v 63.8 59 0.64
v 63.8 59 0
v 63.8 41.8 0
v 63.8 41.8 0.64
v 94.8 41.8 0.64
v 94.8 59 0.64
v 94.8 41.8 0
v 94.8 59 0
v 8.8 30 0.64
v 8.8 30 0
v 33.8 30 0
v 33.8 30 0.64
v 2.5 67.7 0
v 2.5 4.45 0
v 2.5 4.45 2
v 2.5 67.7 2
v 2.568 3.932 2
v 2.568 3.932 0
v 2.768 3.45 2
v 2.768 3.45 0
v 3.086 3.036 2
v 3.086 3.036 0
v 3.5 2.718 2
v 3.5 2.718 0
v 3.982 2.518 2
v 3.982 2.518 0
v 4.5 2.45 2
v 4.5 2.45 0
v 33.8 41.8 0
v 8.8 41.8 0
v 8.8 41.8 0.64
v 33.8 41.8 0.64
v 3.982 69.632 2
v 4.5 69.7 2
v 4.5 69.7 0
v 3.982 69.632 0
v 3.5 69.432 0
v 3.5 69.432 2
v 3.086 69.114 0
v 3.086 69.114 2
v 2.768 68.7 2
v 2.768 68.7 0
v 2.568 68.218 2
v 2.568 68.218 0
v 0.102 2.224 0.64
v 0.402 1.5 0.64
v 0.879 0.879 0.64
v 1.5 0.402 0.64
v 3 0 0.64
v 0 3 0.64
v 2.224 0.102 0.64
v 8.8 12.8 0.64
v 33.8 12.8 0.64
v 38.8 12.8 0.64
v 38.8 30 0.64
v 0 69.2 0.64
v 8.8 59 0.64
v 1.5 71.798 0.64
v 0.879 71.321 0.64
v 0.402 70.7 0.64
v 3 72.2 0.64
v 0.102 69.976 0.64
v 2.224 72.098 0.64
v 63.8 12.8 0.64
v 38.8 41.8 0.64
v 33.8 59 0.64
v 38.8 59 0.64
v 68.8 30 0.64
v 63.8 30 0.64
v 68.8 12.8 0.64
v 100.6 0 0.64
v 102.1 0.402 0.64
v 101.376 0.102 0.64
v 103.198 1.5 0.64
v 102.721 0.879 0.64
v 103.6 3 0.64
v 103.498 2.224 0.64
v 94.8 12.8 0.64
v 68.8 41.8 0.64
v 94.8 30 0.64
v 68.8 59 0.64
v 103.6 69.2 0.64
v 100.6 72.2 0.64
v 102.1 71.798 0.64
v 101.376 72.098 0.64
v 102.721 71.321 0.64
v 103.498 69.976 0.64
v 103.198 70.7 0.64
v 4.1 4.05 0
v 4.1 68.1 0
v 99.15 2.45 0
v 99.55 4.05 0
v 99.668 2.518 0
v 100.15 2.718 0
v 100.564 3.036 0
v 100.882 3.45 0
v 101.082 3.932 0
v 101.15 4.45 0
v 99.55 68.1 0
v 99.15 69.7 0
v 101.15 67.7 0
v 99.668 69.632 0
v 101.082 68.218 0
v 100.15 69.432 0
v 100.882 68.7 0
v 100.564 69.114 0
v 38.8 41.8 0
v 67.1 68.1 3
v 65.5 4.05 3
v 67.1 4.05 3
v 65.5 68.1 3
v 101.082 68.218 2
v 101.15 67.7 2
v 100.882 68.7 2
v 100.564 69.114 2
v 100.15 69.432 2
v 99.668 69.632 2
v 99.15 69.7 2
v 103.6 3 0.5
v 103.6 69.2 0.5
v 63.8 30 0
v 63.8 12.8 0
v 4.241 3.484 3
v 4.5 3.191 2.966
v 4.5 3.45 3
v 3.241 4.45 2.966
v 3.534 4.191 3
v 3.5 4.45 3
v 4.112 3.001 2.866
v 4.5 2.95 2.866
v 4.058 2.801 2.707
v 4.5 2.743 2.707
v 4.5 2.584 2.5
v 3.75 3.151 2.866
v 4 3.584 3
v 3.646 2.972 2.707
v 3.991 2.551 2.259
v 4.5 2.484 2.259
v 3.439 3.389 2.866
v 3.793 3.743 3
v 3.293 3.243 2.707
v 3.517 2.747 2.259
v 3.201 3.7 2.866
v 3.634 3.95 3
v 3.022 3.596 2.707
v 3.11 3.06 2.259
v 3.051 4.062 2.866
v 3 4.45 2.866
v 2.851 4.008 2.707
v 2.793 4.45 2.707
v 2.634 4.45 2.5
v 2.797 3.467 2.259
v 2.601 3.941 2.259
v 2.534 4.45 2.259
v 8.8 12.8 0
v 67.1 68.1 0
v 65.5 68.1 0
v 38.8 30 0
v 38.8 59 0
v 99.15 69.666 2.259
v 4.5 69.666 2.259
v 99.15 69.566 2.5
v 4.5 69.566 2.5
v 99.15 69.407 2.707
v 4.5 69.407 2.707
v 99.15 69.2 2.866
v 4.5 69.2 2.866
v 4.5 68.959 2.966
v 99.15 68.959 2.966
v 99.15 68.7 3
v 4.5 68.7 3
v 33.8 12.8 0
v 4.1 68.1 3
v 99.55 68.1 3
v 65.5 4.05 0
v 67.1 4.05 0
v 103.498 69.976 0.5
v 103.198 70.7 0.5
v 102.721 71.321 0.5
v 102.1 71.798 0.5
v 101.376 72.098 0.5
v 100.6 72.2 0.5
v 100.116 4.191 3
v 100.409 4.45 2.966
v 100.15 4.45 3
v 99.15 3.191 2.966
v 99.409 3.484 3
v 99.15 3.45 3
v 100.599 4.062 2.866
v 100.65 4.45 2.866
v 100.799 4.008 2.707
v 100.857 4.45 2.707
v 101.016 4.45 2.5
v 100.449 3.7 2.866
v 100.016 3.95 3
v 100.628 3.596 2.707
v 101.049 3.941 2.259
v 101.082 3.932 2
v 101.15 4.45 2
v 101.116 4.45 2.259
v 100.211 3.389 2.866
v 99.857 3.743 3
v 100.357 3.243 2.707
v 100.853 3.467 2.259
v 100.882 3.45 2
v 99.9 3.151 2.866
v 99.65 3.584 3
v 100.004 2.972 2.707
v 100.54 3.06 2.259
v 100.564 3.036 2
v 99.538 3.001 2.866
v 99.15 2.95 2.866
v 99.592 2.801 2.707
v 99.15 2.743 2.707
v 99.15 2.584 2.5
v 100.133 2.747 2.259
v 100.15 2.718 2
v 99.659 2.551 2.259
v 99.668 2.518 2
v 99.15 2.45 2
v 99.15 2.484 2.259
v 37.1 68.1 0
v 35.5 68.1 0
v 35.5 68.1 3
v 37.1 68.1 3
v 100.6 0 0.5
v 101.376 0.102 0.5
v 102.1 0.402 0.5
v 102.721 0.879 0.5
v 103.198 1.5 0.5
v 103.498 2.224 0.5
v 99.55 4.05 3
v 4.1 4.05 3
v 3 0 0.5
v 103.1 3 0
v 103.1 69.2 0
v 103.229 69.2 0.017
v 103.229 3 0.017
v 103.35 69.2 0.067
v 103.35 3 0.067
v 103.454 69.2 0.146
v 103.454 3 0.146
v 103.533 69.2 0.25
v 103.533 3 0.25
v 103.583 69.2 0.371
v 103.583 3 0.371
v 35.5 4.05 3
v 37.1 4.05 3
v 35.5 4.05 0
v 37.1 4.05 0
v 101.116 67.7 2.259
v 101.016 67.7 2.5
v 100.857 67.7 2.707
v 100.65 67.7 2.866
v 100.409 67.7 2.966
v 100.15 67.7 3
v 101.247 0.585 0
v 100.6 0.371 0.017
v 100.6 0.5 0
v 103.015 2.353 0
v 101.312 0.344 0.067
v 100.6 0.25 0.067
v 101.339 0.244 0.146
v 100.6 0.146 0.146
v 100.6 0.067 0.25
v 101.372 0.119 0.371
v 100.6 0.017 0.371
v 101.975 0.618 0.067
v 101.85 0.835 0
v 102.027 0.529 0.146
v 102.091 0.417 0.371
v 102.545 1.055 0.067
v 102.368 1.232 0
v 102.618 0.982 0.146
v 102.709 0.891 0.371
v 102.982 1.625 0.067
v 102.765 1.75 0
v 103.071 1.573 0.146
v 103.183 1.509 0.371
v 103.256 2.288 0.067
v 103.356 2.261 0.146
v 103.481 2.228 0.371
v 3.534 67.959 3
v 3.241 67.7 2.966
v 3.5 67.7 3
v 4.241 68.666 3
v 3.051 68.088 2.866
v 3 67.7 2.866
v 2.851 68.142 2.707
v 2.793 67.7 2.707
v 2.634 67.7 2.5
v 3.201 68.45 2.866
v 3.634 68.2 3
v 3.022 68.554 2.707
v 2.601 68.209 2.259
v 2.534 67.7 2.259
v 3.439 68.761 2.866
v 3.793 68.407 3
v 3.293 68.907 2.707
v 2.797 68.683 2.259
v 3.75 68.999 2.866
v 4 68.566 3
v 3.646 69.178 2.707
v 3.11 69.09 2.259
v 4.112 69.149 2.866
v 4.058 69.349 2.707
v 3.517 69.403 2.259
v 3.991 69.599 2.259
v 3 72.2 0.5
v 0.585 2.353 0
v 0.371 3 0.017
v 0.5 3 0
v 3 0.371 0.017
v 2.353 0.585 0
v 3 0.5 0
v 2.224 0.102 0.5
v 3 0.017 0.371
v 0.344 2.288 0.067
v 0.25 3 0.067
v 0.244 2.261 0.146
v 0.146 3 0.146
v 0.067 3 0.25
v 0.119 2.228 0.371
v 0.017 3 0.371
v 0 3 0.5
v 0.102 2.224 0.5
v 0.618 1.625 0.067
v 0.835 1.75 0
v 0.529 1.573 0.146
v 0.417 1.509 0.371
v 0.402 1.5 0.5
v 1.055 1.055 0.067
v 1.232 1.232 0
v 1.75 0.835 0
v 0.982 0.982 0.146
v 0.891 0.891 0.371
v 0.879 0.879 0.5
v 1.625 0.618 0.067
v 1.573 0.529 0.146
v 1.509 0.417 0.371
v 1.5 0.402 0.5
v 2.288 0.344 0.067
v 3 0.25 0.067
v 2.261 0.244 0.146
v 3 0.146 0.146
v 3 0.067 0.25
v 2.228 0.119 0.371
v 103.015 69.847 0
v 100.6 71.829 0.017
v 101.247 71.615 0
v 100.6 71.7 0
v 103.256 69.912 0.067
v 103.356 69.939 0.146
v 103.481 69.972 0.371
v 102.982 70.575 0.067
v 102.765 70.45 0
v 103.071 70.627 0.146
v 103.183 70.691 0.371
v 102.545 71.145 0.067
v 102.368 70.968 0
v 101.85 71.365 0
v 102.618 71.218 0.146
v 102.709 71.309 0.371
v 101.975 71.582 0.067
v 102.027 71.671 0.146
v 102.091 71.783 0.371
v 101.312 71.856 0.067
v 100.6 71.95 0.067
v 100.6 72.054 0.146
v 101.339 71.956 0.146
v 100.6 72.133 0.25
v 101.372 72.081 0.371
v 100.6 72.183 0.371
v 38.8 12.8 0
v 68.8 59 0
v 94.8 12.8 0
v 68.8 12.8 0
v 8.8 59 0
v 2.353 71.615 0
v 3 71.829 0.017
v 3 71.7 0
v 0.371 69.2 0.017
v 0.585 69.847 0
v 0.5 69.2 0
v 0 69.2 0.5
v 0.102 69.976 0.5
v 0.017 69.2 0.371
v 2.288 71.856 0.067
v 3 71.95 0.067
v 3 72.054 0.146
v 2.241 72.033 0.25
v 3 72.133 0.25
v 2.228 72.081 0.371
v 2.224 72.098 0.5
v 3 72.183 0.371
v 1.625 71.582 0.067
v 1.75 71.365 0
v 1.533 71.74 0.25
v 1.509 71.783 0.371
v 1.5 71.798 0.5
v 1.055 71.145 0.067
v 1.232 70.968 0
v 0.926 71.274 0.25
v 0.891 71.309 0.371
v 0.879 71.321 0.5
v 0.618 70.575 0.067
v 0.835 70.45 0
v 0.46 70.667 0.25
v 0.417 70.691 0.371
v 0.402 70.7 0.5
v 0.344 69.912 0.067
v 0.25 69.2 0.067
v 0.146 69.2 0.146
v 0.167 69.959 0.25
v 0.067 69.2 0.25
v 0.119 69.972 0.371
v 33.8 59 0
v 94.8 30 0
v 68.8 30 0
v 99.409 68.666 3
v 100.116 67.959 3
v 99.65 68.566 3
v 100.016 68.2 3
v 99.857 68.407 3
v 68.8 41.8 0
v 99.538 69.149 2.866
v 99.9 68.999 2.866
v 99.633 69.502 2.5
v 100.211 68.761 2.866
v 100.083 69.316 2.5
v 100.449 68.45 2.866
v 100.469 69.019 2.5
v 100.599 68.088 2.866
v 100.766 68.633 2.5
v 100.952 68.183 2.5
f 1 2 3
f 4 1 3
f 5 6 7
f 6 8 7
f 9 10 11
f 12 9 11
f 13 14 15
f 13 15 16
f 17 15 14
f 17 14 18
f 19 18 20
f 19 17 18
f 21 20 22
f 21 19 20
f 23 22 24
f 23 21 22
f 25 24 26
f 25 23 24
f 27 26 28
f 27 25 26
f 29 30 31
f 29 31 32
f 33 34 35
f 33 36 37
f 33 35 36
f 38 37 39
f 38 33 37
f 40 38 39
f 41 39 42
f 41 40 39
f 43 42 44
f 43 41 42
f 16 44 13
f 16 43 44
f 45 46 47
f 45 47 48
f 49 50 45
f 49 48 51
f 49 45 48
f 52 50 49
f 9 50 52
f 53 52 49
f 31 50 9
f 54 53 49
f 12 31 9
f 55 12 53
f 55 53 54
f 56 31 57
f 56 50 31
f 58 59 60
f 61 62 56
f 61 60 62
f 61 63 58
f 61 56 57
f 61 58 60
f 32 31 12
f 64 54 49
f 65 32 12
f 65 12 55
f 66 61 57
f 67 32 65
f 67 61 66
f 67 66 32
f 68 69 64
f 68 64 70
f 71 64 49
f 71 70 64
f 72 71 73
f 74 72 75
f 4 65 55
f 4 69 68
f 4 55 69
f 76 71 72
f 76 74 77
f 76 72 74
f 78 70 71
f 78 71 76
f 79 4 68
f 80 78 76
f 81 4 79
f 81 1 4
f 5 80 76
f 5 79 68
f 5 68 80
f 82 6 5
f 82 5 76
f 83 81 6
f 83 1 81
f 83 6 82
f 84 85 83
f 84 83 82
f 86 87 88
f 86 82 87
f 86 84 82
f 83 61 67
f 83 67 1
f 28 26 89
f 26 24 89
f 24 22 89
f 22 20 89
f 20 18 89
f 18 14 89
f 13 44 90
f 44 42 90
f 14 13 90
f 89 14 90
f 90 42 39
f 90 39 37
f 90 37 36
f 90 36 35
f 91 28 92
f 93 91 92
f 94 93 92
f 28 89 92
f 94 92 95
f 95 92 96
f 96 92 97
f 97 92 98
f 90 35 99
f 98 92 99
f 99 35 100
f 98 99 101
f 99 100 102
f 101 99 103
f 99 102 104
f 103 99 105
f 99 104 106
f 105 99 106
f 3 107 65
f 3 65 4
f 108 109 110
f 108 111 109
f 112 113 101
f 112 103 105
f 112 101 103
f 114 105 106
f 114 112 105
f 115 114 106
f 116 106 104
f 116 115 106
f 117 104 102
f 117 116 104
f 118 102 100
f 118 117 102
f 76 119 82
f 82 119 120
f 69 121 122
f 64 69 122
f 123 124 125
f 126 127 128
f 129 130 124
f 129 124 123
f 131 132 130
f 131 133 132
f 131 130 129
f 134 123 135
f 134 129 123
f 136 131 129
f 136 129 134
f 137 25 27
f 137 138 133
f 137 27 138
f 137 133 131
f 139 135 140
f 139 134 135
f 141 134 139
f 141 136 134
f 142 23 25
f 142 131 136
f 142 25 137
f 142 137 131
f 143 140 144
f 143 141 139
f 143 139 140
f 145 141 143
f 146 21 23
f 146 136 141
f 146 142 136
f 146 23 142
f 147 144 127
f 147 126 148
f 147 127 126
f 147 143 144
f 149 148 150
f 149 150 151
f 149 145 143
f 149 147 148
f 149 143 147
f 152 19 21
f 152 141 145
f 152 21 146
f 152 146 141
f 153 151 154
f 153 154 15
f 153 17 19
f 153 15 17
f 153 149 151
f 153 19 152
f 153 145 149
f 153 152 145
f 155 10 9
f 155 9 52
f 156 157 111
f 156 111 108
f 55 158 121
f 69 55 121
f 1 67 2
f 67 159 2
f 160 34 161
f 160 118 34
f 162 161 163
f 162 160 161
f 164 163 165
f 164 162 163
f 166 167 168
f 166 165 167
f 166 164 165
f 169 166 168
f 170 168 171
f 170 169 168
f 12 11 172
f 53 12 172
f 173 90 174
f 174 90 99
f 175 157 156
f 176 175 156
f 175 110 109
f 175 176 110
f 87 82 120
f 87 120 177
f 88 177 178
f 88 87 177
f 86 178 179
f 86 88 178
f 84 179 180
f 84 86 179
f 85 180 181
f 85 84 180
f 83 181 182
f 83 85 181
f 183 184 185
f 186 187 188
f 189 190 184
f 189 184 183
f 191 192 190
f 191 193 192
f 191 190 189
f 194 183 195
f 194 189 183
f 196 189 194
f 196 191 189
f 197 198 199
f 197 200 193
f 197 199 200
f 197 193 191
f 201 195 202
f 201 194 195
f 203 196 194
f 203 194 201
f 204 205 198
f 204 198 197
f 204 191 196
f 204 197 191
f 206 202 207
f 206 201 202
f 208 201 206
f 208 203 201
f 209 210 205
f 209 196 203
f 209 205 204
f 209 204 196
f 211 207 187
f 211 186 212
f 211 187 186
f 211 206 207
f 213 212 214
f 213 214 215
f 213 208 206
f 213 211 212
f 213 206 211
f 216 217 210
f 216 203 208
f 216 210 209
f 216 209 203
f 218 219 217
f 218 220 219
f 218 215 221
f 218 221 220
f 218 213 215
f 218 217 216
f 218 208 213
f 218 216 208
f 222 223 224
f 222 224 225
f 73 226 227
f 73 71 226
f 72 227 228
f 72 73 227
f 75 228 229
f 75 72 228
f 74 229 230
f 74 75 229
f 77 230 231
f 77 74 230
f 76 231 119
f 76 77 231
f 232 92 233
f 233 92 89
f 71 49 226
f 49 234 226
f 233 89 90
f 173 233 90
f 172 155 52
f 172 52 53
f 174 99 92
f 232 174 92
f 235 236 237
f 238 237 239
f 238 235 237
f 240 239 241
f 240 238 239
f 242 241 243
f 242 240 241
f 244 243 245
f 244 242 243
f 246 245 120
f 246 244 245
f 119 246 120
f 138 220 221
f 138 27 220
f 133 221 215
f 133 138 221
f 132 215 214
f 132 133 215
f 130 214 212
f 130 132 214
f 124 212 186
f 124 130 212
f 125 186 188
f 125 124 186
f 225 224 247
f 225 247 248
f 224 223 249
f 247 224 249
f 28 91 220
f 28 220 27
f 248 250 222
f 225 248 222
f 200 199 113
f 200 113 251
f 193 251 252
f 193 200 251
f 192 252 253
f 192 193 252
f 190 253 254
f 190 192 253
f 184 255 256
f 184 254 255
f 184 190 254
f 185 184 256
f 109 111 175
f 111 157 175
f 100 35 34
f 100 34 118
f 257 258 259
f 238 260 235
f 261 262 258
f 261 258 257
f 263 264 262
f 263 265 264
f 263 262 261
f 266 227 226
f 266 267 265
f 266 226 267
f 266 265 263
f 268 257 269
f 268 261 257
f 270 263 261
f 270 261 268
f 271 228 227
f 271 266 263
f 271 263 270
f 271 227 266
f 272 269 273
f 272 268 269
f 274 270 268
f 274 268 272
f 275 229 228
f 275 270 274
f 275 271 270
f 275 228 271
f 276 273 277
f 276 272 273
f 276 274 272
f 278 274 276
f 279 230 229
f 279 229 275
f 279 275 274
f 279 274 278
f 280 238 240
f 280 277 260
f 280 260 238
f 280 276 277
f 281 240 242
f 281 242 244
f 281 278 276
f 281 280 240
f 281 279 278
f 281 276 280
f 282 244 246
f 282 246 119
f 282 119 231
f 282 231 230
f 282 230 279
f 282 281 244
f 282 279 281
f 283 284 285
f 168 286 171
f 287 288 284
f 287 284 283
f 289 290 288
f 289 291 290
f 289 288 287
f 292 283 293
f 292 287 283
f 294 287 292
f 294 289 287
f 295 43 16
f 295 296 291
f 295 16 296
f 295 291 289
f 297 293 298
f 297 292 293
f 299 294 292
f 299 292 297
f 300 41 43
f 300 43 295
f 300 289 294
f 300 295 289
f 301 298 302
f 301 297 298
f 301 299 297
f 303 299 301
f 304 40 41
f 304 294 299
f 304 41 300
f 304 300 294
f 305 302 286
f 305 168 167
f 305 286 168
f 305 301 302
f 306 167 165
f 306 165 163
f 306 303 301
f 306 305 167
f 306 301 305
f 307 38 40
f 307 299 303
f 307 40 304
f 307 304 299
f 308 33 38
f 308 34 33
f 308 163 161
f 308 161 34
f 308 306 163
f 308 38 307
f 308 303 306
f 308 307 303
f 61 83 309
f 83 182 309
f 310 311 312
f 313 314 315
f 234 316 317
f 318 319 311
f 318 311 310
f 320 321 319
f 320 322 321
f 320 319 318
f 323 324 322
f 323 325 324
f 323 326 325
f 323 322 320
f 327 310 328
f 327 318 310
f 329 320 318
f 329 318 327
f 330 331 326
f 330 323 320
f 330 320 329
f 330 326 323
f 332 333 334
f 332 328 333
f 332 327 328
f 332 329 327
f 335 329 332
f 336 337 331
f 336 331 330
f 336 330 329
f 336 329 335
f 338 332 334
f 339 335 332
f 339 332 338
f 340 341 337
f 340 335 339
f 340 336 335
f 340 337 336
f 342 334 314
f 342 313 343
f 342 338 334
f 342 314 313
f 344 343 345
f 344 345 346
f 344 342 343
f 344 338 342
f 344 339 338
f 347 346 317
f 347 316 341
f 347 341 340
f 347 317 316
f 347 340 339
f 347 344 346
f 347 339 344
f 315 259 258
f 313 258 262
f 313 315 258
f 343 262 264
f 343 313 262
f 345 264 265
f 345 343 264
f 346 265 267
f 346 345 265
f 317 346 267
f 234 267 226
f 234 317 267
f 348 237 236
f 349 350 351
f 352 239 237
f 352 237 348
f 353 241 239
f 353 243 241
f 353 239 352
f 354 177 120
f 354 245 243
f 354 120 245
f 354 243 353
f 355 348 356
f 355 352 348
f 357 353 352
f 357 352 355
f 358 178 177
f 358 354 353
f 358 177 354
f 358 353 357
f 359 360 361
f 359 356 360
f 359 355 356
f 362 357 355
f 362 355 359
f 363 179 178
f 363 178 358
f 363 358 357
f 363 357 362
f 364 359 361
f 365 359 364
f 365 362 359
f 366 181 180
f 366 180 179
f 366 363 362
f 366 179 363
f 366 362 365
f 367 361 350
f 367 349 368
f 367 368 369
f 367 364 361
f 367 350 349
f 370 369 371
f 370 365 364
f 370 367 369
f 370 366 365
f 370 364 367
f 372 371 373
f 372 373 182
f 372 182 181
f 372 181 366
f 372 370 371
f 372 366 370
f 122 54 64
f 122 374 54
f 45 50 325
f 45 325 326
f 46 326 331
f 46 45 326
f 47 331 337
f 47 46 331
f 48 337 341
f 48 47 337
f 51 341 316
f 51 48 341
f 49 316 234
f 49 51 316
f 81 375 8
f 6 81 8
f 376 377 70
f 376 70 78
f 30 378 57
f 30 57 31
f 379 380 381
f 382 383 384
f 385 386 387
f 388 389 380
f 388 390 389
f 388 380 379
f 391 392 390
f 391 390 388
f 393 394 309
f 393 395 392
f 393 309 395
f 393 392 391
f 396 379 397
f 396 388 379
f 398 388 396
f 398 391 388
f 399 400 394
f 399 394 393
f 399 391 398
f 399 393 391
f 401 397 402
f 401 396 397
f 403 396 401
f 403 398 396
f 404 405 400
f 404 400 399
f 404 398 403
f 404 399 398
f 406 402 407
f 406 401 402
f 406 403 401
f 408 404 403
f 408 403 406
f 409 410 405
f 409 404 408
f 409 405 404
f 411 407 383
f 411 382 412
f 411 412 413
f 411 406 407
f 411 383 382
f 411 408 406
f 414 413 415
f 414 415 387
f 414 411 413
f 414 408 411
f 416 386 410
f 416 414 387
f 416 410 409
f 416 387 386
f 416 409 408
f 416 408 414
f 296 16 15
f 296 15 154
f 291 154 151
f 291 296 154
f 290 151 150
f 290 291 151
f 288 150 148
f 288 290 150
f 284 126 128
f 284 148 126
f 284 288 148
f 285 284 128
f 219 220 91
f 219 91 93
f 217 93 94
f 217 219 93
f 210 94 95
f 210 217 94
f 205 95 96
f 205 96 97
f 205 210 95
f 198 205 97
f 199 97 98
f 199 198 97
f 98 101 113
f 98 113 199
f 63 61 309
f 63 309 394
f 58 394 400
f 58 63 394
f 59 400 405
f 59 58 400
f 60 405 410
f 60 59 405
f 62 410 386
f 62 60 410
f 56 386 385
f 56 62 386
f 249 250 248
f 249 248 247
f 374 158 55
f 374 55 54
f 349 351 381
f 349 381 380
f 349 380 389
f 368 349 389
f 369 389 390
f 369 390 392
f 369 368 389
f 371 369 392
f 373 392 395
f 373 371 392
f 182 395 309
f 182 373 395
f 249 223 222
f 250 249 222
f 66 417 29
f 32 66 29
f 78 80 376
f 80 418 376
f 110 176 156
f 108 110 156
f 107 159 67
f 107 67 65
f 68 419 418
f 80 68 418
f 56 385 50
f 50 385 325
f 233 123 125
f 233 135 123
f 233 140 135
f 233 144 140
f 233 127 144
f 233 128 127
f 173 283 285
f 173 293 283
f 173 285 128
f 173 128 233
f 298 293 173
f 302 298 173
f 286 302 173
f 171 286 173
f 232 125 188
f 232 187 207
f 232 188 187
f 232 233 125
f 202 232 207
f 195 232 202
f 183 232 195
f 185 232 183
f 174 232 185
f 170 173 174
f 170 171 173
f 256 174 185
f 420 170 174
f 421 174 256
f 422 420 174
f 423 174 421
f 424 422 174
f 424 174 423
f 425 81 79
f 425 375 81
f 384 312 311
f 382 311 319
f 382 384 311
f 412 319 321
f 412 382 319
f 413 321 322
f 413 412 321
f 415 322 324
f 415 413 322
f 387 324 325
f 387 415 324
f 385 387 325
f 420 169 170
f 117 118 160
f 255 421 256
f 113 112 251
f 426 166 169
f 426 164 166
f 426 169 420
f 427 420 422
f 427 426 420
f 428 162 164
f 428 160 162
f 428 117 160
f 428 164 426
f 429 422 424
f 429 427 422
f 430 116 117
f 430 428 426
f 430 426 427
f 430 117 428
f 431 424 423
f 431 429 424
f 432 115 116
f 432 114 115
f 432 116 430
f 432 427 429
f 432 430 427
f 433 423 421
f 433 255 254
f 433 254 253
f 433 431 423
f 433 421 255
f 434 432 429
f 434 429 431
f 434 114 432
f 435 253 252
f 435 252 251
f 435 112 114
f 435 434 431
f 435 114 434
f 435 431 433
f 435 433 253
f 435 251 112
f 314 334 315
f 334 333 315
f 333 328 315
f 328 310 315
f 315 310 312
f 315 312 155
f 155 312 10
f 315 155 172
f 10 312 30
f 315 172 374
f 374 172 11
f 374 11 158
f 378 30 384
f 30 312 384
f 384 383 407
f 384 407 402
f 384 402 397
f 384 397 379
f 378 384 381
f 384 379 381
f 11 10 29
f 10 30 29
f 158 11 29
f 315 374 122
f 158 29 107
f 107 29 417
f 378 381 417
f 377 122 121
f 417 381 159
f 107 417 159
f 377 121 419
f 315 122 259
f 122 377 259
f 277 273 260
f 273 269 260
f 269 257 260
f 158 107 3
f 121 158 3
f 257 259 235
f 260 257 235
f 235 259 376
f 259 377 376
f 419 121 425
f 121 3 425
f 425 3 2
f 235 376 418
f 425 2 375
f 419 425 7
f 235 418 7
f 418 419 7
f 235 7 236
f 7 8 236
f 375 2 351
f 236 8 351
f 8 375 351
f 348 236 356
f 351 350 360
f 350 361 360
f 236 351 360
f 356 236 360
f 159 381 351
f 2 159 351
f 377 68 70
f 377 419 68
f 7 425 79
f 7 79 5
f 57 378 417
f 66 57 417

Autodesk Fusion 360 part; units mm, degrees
sketch "Sketch1" plane through (0, 0, 0) normal (0, 0, 1) x (1, 0, 0)
  line L0 (0, 0) -> (103.6, 0)
  line L1 (103.6, 0) -> (103.6, 72.2)
  line L2 (103.6, 72.2) -> (0, 72.2)
  line L3 (0, 72.2) -> (0, 0)
  line L4 (94.8, 80) -> (94.8, -25)
  line L5 (68.8, 80) -> (68.8, -25)
  line L6 (63.8, 80) -> (63.8, -25)
  line L7 (38.8, 80) -> (38.8, -25)
  line L8 (33.8, 80) -> (33.8, -25)
  line L9 (8.8, 80) -> (8.8, -25)
  line L10 (-20, 59) -> (140, 59)
  line L11 (-20, 41.8) -> (140, 41.8)
  line L12 (-20, 30) -> (140, 30)
  line L13 (-20, 12.8) -> (140, 12.8)
  line L14 (2.5, 69.7) -> (101.15, 69.7)
  line L15 (101.15, 69.7) -> (101.15, 2.45)
  line L16 (101.15, 2.45) -> (2.5, 2.45)
  line L17 (2.5, 2.45) -> (2.5, 69.7)
  line L18 (4.1, 68.1) -> (99.55, 68.1)
  line L19 (99.55, 68.1) -> (99.55, 4.05)
  line L20 (99.55, 4.05) -> (4.1, 4.05)
  line L21 (4.1, 4.05) -> (4.1, 68.1)
  line L22 (35.5, 80) -> (35.5, -25)
  line L23 (37.1, -25) -> (37.1, 80)
  line L24 (65.5, 80) -> (65.5, -25)
  line L25 (67.1, -25) -> (67.1, 80)
  circle A0 centre (6.5, 65.9) radius 1.6
  circle A1 centre (97.3, 65.8) radius 1.6
  circle A2 centre (97.2, 6.1) radius 1.6
  circle A3 centre (6.5, 6.3) radius 1.6
  dimension "d1" = 103.6
  dimension "d2" = 72.2
  dimension "d3" = 8.8
  dimension "d4" = 26
  dimension "d5" = 5
  dimension "d7" = 5
  dimension "d8" = 25
  dimension "d10" = 8.8
  dimension "d11" = 25
  dimension "d12" = 17.2
  dimension "d13" = 17.2
  dimension "d14" = 11.8
  dimension "d15" = 12.8
  dimension "d16" = 13.2
  dimension "d17" = 2.5
  dimension "d18" = 2.5
  dimension "d19" = 2.45
  dimension "d20" = 2.45
  dimension "d21" = 1.6
  dimension "d22" = 1.6
  dimension "d23" = 1.6
  dimension "d24" = 1.6
  dimension "d37" = 1.6
  dimension "d38" = 1.7
  dimension "d39" = 1.7
  dimension "d40" = 1.6
  dimension "d41" = 1.7
  dimension "d44" = 3.2
  dimension "d45" = 6.5
  dimension "d46" = 6.3
  dimension "d47" = 3.2
  dimension "d48" = 6.3
  dimension "d49" = 6.4
  dimension "d50" = 3.2
  dimension "d51" = 6.4
  dimension "d52" = 6.1
  dimension "d53" = 3.2
  dimension "d54" = 6.5
  dimension "d55" = 6.3
extrude "Extrude1" add sketch "Sketch1" along normal blind 0.64 contours L0 L3 L9 L13 L16 L17 | L0 L8 L9 L16 | L3 L12 L13 L17 | L0 L8 L16 L22 | L9 L13 L16 L17 L20 L21 | L8 L9 L16 L20 | L3 L11 L12 L17 | L12 L13 L17 L21 | L0 L16 L22 L23 | L8 L16 L20 L22 | L9 L13 L20 L21 | L8 L9 L13 L20 | L3 L10 L11 L17 | L11 L12 L17 L21 | L9 L12 L13 L21 | L0 L7 L16 L23 | L16 L20 L22 L23 | L8 L13 L20 L22 | L2 L3 L9 L10 L14 L17 | L10 L11 L17 L21 | L9 L11 L12 L21 | L0 L6 L7 L16 | L7 L16 L20 L23 | L13 L20 L22 L23 | L8 L12 L13 L22 | L8 L9 L11 L12 | L9 L10 L14 L17 L18 L21 | L9 L10 L11 L21 | L0 L6 L16 L24 | L6 L7 L16 L20 | L7 L13 L20 L23 | L12 L13 L22 L23 | L8 L11 L12 L22 | L2 L8 L9 L14 | L9 L10 L18 L21 | L0 L16 L24 L25 | L6 L16 L20 L24 | L6 L7 L13 L20 | L7 L12 L13 L23 | L11 L12 L22 L23 | L8 L10 L11 L22 | L8 L9 L10 L18 | L2 L8 L14 L22 | L8 L9 L14 L18 | L0 L5 L16 L25 | L16 L20 L24 L25 | L6 L13 L20 L24 | L7 L11 L12 L23 | L10 L11 L22 L23 | L8 L10 L18 L22 | L2 L14 L22 L23 | L8 L14 L18 L22 | L0 L4 L5 L16 | L5 L16 L20 L25 | L13 L20 L24 L25 | L6 L12 L13 L24 | L6 L7 L11 L12 | L7 L10 L11 L23 | L10 L18 L22 L23 | L2 L7 L14 L23 | L14 L18 L22 L23 | L0 L1 L4 L13 L15 L16 | L4 L5 L16 L20 | L5 L13 L20 L25 | L12 L13 L24 L25 | L6 L11 L12 L24 | L7 L10 L18 L23 | L2 L6 L7 L14 | L7 L14 L18 L23 | L4 L13 L15 L16 L19 L20 | L4 L5 L13 L20 | L5 L12 L13 L25 | L11 L12 L24 L25 | L6 L10 L11 L24 | L6 L7 L10 L18 | L2 L6 L14 L24 | L6 L7 L14 L18 | L1 L12 L13 L15 | L4 L13 L19 L20 | L5 L11 L12 L25 | L10 L11 L24 L25 | L6 L10 L18 L24 | L2 L14 L24 L25 | L6 L14 L18 L24 | L1 L11 L12 L15 | L12 L13 L15 L19 | L4 L12 L13 L19 | L4 L5 L11 L12 | L5 L10 L11 L25 | L10 L18 L24 L25 | L2 L5 L14 L25 | L14 L18 L24 L25 | L1 L10 L11 L15 | L11 L12 L15 L19 | L4 L11 L12 L19 | L5 L10 L18 L25 | L2 L4 L5 L14 | L5 L14 L18 L25 | L1 L2 L4 L10 L14 L15 | L10 L11 L15 L19 | L4 L10 L11 L19 | L4 L5 L10 L18 | L4 L5 L14 L18 | L4 L10 L14 L15 L18 L19 | L4 L10 L18 L19 | A0 | A1 | A2 | A3 makes body 1
extrude "Extrude2" add sketch "Sketch1" along normal blind 3 separate body contours L9 L13 L16 L17 L20 L21 | L8 L9 L16 L20 | L12 L13 L17 L21 | L8 L16 L20 L22 | L11 L12 L17 L21 | L16 L20 L22 L23 | L10 L11 L17 L21 | L7 L16 L20 L23 | L9 L10 L14 L17 L18 L21 | L6 L7 L16 L20 | L6 L16 L20 L24 | L8 L9 L14 L18 | L16 L20 L24 L25 | L8 L14 L18 L22 | L5 L16 L20 L25 | L14 L18 L22 L23 | L4 L5 L16 L20 | L7 L14 L18 L23 | L4 L13 L15 L16 L19 L20 | L6 L7 L14 L18 | L6 L14 L18 L24 | L12 L13 L15 L19 | L14 L18 L24 L25 | L11 L12 L15 L19 | L5 L14 L18 L25 | L10 L11 L15 L19 | L4 L5 L14 L18 | L4 L10 L14 L15 L18 L19 makes body 2
fillet "Fillet1" radius 3 4 edges at (103.6, 0, 0.32) (103.6, 72.2, 0.32) (0, 0, 0.32) (0, 72.2, 0.32) on bodies 1 2
fillet "Fillet1" radius 2 4 edges at (2.5, 69.7, 1.5) (2.5, 2.45, 1.5) (101.15, 2.45, 1.5) (101.15, 69.7, 1.5) on bodies 1 2
fillet "Fillet2" radius 0.5 8 edges at (51.8, 72.2, 0) (0.8787, 71.3213, 0) (0, 36.1, 0) (0.8787, 0.8787, 0) (51.8, 0, 0) (102.7213, 0.8787, 0) (103.6, 36.1, 0) (102.7213, 71.3213, 0) on bodies 1
fillet "Fillet3" radius 1 8 edges at (100.5642, 69.1142, 3) (51.825, 69.7, 3) (3.0858, 69.1142, 3) (2.5, 36.075, 3) (3.0858, 3.0358, 3) (51.825, 2.45, 3) (100.5642, 3.0358, 3) (101.15, 36.075, 3) on bodies 2
extrude "Extrude3" add sketch "Sketch1" along normal blind 3 separate body contours L13 L20 L22 L23 | L12 L13 L22 L23 | L11 L12 L22 L23 | L10 L11 L22 L23 | L13 L20 L24 L25 | L10 L18 L22 L23 | L12 L13 L24 L25 | L11 L12 L24 L25 | L10 L11 L24 L25 | L10 L18 L24 L25 makes body 3 at (35.5, 46.75, 1) makes body 4 at (65.5, 46.75, 1)
equation "d10 = d3"
equation "d12 = d13"
equation "d18 = d17"
